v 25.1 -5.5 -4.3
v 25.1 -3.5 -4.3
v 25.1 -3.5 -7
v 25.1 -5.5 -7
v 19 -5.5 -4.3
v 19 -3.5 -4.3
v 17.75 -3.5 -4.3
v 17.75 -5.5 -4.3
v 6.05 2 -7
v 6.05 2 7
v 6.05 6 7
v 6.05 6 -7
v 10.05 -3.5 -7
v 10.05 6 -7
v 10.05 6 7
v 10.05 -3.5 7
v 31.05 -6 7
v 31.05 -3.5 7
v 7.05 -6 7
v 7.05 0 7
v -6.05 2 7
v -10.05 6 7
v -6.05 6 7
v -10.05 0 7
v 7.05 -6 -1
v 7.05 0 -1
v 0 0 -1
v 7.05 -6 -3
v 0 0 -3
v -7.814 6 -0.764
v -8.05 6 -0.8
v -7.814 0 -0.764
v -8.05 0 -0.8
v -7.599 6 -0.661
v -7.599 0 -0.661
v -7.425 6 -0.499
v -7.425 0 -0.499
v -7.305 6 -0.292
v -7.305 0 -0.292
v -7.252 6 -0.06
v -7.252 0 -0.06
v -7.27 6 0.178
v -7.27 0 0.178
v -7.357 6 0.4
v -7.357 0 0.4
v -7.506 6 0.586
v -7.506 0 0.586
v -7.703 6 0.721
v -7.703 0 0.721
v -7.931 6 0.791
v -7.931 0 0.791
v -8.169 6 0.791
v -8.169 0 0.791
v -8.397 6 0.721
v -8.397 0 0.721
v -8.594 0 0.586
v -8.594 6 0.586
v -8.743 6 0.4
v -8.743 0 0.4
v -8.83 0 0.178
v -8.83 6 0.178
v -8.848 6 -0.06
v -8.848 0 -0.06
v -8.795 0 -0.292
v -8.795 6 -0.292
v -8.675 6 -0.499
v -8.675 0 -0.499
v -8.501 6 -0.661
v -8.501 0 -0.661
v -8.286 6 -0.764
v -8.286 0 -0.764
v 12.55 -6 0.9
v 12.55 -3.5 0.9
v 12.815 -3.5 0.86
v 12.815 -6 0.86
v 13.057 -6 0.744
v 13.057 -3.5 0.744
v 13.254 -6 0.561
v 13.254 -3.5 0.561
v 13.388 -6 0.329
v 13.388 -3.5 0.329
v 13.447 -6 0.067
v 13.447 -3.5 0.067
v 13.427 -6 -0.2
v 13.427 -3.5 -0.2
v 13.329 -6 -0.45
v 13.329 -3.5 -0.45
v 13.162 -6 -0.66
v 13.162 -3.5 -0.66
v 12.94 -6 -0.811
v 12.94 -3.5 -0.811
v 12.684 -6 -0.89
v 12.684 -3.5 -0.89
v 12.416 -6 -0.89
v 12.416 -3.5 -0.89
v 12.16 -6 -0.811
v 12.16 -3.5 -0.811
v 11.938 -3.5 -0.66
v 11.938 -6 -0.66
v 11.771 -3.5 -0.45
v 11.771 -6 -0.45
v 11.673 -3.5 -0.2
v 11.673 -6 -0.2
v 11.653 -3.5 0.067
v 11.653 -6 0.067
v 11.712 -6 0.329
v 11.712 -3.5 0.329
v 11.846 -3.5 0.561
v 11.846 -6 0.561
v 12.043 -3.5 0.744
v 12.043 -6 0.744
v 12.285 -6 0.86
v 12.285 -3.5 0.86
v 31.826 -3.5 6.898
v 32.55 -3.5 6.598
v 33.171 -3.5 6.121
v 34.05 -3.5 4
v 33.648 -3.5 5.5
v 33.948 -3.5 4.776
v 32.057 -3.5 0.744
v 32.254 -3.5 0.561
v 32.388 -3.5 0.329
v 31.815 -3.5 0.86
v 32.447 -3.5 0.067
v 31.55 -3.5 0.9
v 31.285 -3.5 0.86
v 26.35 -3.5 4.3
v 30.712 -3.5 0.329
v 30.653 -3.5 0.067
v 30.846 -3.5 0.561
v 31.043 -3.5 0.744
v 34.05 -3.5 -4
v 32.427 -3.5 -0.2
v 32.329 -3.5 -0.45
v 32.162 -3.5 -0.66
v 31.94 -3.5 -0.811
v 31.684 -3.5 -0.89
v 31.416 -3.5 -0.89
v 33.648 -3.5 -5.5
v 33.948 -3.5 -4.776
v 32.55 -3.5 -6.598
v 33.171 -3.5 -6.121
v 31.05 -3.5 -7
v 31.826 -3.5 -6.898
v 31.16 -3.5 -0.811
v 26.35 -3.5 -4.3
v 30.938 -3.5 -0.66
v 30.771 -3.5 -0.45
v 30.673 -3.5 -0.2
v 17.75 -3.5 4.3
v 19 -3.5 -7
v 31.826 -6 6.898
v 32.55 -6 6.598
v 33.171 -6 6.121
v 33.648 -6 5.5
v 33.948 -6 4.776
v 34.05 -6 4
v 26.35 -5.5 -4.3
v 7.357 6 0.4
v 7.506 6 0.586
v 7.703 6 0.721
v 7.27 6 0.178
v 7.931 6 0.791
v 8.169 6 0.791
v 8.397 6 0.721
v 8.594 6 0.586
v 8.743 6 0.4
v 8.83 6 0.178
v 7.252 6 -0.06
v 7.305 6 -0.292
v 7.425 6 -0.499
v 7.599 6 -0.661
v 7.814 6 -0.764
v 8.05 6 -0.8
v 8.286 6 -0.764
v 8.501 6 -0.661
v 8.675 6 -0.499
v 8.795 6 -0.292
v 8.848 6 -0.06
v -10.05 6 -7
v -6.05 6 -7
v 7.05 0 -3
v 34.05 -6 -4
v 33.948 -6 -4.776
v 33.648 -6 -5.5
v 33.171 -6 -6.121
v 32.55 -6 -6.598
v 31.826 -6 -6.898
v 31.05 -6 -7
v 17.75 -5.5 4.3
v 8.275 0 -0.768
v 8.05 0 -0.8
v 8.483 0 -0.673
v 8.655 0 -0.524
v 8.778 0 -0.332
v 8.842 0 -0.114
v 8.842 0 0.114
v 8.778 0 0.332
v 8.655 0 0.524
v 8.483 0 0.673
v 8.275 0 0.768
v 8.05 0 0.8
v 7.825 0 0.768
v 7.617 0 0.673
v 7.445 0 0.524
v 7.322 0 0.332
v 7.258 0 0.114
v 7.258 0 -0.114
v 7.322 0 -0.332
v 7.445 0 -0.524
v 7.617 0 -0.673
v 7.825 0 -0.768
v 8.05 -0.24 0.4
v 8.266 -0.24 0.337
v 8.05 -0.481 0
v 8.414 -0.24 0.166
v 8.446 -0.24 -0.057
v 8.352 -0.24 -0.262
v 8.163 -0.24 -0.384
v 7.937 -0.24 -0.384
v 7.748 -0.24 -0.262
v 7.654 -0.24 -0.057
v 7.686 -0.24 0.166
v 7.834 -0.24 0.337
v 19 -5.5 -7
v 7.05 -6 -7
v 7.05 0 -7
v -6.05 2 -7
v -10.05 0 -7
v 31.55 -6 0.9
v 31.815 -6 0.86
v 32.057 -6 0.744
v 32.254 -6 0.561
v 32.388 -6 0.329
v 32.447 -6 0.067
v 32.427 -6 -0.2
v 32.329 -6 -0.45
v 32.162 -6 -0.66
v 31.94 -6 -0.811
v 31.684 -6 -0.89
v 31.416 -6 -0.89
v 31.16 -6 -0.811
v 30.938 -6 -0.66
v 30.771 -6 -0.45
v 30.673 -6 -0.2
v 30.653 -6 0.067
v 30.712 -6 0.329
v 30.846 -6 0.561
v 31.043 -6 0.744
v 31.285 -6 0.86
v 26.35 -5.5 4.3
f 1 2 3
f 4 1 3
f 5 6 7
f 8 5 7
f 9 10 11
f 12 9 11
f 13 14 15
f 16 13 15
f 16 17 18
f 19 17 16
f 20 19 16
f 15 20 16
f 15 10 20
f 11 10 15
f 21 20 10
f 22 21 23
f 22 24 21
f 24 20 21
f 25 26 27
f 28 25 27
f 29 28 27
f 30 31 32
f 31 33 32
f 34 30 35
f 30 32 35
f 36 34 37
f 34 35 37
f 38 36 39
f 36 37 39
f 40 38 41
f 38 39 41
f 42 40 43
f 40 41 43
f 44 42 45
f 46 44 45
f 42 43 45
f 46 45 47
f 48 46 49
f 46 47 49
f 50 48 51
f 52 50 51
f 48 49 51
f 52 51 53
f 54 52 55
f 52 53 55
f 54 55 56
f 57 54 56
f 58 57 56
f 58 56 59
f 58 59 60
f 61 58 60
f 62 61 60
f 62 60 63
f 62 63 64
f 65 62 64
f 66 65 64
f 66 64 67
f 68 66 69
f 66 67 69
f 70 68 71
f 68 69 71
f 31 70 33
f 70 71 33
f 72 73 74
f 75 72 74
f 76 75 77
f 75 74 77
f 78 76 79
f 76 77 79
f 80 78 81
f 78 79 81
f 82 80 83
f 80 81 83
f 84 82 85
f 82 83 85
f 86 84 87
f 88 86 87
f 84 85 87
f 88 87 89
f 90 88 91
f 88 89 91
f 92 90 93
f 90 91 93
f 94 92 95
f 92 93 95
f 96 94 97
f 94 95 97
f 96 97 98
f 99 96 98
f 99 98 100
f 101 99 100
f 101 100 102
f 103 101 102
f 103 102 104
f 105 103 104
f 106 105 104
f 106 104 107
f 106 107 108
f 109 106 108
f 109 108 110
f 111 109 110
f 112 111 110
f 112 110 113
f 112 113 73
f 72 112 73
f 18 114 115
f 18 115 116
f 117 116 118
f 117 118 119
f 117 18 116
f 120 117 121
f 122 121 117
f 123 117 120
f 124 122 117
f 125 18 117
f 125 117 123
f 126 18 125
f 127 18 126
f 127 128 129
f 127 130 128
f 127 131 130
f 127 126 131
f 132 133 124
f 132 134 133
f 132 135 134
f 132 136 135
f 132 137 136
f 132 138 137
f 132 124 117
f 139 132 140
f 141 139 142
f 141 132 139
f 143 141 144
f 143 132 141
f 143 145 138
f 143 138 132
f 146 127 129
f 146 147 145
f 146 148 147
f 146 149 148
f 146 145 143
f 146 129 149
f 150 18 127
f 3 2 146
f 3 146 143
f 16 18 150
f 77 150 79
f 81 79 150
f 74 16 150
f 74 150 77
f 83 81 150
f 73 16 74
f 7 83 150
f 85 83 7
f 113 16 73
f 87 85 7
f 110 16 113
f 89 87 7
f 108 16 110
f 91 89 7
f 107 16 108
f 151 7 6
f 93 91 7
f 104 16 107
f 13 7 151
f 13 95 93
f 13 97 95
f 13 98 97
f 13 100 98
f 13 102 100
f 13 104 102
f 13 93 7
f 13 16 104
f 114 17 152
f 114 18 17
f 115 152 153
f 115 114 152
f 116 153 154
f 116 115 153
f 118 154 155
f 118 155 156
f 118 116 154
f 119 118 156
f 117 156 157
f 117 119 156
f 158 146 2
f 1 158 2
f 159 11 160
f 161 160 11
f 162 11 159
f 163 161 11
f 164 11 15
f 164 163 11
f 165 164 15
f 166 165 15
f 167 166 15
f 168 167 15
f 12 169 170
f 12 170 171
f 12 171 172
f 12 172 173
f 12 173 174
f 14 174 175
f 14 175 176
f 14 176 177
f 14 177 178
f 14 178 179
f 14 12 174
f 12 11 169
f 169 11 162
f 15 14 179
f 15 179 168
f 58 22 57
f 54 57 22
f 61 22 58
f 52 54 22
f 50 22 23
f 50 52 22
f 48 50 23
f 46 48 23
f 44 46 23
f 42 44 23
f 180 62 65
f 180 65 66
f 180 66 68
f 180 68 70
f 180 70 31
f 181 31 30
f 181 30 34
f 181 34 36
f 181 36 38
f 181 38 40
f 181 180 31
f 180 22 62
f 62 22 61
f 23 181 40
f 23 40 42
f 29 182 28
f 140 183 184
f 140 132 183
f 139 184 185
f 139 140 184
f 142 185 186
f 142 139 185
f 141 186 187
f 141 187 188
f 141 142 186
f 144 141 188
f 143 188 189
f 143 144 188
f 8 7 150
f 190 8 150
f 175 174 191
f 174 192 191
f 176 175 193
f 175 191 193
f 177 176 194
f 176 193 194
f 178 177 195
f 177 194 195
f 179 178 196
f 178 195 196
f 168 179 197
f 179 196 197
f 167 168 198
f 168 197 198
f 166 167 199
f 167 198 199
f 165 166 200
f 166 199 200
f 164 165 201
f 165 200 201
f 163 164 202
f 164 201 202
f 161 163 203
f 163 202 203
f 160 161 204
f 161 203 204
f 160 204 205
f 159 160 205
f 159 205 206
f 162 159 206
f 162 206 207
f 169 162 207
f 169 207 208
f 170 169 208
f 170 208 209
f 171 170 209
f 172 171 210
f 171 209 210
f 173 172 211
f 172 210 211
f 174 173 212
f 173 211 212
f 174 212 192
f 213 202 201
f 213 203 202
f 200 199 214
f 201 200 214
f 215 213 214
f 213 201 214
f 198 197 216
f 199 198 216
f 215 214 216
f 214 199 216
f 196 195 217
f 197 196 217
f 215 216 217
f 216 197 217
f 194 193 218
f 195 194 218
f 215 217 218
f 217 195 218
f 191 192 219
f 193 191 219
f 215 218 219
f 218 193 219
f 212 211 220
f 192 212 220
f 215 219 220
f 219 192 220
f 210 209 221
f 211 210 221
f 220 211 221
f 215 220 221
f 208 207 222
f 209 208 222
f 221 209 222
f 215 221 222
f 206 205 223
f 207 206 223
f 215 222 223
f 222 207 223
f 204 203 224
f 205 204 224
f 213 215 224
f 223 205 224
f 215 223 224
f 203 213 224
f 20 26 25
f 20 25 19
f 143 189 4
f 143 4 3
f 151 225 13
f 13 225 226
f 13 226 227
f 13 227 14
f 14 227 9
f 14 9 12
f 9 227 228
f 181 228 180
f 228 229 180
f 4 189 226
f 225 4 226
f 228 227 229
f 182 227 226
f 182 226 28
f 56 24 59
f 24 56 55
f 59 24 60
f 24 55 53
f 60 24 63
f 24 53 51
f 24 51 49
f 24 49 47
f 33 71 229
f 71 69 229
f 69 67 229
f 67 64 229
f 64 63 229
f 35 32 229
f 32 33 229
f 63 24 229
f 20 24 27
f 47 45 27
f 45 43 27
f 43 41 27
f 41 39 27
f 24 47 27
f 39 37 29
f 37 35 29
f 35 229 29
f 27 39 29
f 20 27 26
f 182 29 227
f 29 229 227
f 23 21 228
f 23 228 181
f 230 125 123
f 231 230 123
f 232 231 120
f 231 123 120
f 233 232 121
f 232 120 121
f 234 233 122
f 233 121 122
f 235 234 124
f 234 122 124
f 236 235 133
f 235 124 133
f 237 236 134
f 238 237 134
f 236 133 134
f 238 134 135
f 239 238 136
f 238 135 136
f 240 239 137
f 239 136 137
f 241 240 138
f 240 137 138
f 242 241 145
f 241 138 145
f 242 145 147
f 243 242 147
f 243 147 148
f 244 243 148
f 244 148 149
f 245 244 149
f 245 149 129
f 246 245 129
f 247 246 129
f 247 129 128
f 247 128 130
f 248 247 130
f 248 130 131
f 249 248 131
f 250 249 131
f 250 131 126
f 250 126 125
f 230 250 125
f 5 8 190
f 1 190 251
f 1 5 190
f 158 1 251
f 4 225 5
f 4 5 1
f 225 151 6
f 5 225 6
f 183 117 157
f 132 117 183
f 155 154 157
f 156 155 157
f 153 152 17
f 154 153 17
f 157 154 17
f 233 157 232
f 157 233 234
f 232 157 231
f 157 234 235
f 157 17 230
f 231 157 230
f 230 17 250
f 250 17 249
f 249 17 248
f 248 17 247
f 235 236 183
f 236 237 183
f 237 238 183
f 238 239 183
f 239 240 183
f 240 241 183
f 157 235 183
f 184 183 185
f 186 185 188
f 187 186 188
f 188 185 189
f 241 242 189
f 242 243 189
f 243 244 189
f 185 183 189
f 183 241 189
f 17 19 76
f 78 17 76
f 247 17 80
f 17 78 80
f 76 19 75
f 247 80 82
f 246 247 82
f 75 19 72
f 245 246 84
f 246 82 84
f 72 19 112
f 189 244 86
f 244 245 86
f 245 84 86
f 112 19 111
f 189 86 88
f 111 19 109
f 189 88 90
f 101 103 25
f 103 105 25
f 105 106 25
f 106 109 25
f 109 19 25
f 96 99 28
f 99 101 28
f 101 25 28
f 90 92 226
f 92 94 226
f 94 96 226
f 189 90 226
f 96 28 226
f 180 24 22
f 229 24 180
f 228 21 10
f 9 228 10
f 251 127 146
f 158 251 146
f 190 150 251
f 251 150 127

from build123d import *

# Parameters (mm, degrees)
SKETCH_4_W             = 20.1
SKETCH_4_H             = 14
EXTRUDE_3_DEPTH        = 6
SKETCH_5_W             = 12.1
SKETCH_5_H             = 4
CUT_EXTRUDE_1_DEPTH    = 19.24835609
SKETCH_6_W             = 3
SKETCH_6_H             = 14
EXTRUDE_4_DEPTH        = 6
EXTRUDE_START          = -6
EXTRUDE_5_DEPTH        = 2
SKETCH_8_W             = 14
SKETCH_8_H             = 2.5
EXTRUDE_6_DEPTH        = 24
CUT_EXTRUDE_2_DEPTH    = 2
SKETCH_10_R            = 0.9
CUT_EXTRUDE_3_DEPTH    = 37.036821447
FILLET_1_R             = 3
HOLE_WIZARD_M2_2_D     = 1.6
HOLE_WIZARD_M2_2_DEPTH = 6
HOLE_WIZARD_M2_2_TIP   = 0.480688495


with BuildPart() as part:
    # 草图4 → 凸台-拉伸3 (new body)
    with BuildSketch(Plane(origin=(0, 0, 0), x_dir=(1, 0, 0), z_dir=(0, 1, 0))):
        Rectangle(SKETCH_4_W, SKETCH_4_H)
    extrude(amount=EXTRUDE_3_DEPTH)

    # 草图5 → 切除-拉伸1 (cut, through all)
    with BuildSketch(Plane.XY.offset(7)):
        with Locations((0, 4)):
            Rectangle(SKETCH_5_W, SKETCH_5_H)
    extrude(amount=-CUT_EXTRUDE_1_DEPTH, mode=Mode.SUBTRACT)

    # 草图6 → 凸台-拉伸4 (add)
    with BuildSketch(Plane.XZ):
        with Locations((8.55, 0)):
            Rectangle(SKETCH_6_W, SKETCH_6_H)
    extrude(amount=EXTRUDE_4_DEPTH)

    # 草图7 → 凸台-拉伸5 (add)
    with BuildSketch(Plane(origin=(0, 0, -7), x_dir=(-1, 0, 0), z_dir=(0, 0, -1)).offset(EXTRUDE_START)):
        Polygon((-7.05, -6), (0, 0), (-7.05, 0), align=None)
    extrude(amount=EXTRUDE_5_DEPTH)

    # 草图8 → 凸台-拉伸6 (add)
    with BuildSketch(Plane(origin=(10.05, 0, 0), x_dir=(0, 0, -1), z_dir=(1, 0, 0))):
        with Locations((0, -4.75)):
            Rectangle(SKETCH_8_W, SKETCH_8_H)
    extrude(amount=EXTRUDE_6_DEPTH)

    # 草图9 → 切除-拉伸2 (cut)
    with BuildSketch(Plane(origin=(0, -3.5, 0), x_dir=(1, 0, 0), z_dir=(0, 1, 0))):
        Polygon((17.75, 4.3), (17.75, -4.3), (26.35, -4.3), (26.35, 4.3), (25.1, 4.3), (25.1, 7), (19, 7), (19, 4.3), align=None)
    extrude(amount=-CUT_EXTRUDE_2_DEPTH, mode=Mode.SUBTRACT)

    # 草图10 → 切除-拉伸3 (cut, through all)
    with BuildSketch(Plane(origin=(0, -3.5, 0), x_dir=(1, 0, 0), z_dir=(0, 1, 0))):
        with Locations(Location((12.55, 0, 0), (0, 0, 270))):
            Circle(SKETCH_10_R)
        with Locations(Location((31.55, 0, 0), (0, 0, 270))):
            Circle(SKETCH_10_R)
    extrude(amount=-CUT_EXTRUDE_3_DEPTH, mode=Mode.SUBTRACT)

    # 圆角1
    fillet_1_edges = [part.edges().sort_by_distance(p)[0] for p in [
        (34.05, -4.75, 7),
        (34.05, -4.75, -7),
    ]]
    fillet(fillet_1_edges, radius=FILLET_1_R)

    # M2 螺纹孔的螺纹孔钻头2
    with Locations(Plane(origin=(-8.05, 6, 0), x_dir=(0, 0, 1), z_dir=(0, 1, 0))):
        with Locations((0, 0), (0, 16.1)):
            Hole(HOLE_WIZARD_M2_2_D / 2, depth=HOLE_WIZARD_M2_2_DEPTH)
            with Locations((0, 0, -(HOLE_WIZARD_M2_2_DEPTH + HOLE_WIZARD_M2_2_TIP / 2))):  # 118° drill point
                Cone(0, HOLE_WIZARD_M2_2_D / 2, HOLE_WIZARD_M2_2_TIP, mode=Mode.SUBTRACT)


solid = part.part
